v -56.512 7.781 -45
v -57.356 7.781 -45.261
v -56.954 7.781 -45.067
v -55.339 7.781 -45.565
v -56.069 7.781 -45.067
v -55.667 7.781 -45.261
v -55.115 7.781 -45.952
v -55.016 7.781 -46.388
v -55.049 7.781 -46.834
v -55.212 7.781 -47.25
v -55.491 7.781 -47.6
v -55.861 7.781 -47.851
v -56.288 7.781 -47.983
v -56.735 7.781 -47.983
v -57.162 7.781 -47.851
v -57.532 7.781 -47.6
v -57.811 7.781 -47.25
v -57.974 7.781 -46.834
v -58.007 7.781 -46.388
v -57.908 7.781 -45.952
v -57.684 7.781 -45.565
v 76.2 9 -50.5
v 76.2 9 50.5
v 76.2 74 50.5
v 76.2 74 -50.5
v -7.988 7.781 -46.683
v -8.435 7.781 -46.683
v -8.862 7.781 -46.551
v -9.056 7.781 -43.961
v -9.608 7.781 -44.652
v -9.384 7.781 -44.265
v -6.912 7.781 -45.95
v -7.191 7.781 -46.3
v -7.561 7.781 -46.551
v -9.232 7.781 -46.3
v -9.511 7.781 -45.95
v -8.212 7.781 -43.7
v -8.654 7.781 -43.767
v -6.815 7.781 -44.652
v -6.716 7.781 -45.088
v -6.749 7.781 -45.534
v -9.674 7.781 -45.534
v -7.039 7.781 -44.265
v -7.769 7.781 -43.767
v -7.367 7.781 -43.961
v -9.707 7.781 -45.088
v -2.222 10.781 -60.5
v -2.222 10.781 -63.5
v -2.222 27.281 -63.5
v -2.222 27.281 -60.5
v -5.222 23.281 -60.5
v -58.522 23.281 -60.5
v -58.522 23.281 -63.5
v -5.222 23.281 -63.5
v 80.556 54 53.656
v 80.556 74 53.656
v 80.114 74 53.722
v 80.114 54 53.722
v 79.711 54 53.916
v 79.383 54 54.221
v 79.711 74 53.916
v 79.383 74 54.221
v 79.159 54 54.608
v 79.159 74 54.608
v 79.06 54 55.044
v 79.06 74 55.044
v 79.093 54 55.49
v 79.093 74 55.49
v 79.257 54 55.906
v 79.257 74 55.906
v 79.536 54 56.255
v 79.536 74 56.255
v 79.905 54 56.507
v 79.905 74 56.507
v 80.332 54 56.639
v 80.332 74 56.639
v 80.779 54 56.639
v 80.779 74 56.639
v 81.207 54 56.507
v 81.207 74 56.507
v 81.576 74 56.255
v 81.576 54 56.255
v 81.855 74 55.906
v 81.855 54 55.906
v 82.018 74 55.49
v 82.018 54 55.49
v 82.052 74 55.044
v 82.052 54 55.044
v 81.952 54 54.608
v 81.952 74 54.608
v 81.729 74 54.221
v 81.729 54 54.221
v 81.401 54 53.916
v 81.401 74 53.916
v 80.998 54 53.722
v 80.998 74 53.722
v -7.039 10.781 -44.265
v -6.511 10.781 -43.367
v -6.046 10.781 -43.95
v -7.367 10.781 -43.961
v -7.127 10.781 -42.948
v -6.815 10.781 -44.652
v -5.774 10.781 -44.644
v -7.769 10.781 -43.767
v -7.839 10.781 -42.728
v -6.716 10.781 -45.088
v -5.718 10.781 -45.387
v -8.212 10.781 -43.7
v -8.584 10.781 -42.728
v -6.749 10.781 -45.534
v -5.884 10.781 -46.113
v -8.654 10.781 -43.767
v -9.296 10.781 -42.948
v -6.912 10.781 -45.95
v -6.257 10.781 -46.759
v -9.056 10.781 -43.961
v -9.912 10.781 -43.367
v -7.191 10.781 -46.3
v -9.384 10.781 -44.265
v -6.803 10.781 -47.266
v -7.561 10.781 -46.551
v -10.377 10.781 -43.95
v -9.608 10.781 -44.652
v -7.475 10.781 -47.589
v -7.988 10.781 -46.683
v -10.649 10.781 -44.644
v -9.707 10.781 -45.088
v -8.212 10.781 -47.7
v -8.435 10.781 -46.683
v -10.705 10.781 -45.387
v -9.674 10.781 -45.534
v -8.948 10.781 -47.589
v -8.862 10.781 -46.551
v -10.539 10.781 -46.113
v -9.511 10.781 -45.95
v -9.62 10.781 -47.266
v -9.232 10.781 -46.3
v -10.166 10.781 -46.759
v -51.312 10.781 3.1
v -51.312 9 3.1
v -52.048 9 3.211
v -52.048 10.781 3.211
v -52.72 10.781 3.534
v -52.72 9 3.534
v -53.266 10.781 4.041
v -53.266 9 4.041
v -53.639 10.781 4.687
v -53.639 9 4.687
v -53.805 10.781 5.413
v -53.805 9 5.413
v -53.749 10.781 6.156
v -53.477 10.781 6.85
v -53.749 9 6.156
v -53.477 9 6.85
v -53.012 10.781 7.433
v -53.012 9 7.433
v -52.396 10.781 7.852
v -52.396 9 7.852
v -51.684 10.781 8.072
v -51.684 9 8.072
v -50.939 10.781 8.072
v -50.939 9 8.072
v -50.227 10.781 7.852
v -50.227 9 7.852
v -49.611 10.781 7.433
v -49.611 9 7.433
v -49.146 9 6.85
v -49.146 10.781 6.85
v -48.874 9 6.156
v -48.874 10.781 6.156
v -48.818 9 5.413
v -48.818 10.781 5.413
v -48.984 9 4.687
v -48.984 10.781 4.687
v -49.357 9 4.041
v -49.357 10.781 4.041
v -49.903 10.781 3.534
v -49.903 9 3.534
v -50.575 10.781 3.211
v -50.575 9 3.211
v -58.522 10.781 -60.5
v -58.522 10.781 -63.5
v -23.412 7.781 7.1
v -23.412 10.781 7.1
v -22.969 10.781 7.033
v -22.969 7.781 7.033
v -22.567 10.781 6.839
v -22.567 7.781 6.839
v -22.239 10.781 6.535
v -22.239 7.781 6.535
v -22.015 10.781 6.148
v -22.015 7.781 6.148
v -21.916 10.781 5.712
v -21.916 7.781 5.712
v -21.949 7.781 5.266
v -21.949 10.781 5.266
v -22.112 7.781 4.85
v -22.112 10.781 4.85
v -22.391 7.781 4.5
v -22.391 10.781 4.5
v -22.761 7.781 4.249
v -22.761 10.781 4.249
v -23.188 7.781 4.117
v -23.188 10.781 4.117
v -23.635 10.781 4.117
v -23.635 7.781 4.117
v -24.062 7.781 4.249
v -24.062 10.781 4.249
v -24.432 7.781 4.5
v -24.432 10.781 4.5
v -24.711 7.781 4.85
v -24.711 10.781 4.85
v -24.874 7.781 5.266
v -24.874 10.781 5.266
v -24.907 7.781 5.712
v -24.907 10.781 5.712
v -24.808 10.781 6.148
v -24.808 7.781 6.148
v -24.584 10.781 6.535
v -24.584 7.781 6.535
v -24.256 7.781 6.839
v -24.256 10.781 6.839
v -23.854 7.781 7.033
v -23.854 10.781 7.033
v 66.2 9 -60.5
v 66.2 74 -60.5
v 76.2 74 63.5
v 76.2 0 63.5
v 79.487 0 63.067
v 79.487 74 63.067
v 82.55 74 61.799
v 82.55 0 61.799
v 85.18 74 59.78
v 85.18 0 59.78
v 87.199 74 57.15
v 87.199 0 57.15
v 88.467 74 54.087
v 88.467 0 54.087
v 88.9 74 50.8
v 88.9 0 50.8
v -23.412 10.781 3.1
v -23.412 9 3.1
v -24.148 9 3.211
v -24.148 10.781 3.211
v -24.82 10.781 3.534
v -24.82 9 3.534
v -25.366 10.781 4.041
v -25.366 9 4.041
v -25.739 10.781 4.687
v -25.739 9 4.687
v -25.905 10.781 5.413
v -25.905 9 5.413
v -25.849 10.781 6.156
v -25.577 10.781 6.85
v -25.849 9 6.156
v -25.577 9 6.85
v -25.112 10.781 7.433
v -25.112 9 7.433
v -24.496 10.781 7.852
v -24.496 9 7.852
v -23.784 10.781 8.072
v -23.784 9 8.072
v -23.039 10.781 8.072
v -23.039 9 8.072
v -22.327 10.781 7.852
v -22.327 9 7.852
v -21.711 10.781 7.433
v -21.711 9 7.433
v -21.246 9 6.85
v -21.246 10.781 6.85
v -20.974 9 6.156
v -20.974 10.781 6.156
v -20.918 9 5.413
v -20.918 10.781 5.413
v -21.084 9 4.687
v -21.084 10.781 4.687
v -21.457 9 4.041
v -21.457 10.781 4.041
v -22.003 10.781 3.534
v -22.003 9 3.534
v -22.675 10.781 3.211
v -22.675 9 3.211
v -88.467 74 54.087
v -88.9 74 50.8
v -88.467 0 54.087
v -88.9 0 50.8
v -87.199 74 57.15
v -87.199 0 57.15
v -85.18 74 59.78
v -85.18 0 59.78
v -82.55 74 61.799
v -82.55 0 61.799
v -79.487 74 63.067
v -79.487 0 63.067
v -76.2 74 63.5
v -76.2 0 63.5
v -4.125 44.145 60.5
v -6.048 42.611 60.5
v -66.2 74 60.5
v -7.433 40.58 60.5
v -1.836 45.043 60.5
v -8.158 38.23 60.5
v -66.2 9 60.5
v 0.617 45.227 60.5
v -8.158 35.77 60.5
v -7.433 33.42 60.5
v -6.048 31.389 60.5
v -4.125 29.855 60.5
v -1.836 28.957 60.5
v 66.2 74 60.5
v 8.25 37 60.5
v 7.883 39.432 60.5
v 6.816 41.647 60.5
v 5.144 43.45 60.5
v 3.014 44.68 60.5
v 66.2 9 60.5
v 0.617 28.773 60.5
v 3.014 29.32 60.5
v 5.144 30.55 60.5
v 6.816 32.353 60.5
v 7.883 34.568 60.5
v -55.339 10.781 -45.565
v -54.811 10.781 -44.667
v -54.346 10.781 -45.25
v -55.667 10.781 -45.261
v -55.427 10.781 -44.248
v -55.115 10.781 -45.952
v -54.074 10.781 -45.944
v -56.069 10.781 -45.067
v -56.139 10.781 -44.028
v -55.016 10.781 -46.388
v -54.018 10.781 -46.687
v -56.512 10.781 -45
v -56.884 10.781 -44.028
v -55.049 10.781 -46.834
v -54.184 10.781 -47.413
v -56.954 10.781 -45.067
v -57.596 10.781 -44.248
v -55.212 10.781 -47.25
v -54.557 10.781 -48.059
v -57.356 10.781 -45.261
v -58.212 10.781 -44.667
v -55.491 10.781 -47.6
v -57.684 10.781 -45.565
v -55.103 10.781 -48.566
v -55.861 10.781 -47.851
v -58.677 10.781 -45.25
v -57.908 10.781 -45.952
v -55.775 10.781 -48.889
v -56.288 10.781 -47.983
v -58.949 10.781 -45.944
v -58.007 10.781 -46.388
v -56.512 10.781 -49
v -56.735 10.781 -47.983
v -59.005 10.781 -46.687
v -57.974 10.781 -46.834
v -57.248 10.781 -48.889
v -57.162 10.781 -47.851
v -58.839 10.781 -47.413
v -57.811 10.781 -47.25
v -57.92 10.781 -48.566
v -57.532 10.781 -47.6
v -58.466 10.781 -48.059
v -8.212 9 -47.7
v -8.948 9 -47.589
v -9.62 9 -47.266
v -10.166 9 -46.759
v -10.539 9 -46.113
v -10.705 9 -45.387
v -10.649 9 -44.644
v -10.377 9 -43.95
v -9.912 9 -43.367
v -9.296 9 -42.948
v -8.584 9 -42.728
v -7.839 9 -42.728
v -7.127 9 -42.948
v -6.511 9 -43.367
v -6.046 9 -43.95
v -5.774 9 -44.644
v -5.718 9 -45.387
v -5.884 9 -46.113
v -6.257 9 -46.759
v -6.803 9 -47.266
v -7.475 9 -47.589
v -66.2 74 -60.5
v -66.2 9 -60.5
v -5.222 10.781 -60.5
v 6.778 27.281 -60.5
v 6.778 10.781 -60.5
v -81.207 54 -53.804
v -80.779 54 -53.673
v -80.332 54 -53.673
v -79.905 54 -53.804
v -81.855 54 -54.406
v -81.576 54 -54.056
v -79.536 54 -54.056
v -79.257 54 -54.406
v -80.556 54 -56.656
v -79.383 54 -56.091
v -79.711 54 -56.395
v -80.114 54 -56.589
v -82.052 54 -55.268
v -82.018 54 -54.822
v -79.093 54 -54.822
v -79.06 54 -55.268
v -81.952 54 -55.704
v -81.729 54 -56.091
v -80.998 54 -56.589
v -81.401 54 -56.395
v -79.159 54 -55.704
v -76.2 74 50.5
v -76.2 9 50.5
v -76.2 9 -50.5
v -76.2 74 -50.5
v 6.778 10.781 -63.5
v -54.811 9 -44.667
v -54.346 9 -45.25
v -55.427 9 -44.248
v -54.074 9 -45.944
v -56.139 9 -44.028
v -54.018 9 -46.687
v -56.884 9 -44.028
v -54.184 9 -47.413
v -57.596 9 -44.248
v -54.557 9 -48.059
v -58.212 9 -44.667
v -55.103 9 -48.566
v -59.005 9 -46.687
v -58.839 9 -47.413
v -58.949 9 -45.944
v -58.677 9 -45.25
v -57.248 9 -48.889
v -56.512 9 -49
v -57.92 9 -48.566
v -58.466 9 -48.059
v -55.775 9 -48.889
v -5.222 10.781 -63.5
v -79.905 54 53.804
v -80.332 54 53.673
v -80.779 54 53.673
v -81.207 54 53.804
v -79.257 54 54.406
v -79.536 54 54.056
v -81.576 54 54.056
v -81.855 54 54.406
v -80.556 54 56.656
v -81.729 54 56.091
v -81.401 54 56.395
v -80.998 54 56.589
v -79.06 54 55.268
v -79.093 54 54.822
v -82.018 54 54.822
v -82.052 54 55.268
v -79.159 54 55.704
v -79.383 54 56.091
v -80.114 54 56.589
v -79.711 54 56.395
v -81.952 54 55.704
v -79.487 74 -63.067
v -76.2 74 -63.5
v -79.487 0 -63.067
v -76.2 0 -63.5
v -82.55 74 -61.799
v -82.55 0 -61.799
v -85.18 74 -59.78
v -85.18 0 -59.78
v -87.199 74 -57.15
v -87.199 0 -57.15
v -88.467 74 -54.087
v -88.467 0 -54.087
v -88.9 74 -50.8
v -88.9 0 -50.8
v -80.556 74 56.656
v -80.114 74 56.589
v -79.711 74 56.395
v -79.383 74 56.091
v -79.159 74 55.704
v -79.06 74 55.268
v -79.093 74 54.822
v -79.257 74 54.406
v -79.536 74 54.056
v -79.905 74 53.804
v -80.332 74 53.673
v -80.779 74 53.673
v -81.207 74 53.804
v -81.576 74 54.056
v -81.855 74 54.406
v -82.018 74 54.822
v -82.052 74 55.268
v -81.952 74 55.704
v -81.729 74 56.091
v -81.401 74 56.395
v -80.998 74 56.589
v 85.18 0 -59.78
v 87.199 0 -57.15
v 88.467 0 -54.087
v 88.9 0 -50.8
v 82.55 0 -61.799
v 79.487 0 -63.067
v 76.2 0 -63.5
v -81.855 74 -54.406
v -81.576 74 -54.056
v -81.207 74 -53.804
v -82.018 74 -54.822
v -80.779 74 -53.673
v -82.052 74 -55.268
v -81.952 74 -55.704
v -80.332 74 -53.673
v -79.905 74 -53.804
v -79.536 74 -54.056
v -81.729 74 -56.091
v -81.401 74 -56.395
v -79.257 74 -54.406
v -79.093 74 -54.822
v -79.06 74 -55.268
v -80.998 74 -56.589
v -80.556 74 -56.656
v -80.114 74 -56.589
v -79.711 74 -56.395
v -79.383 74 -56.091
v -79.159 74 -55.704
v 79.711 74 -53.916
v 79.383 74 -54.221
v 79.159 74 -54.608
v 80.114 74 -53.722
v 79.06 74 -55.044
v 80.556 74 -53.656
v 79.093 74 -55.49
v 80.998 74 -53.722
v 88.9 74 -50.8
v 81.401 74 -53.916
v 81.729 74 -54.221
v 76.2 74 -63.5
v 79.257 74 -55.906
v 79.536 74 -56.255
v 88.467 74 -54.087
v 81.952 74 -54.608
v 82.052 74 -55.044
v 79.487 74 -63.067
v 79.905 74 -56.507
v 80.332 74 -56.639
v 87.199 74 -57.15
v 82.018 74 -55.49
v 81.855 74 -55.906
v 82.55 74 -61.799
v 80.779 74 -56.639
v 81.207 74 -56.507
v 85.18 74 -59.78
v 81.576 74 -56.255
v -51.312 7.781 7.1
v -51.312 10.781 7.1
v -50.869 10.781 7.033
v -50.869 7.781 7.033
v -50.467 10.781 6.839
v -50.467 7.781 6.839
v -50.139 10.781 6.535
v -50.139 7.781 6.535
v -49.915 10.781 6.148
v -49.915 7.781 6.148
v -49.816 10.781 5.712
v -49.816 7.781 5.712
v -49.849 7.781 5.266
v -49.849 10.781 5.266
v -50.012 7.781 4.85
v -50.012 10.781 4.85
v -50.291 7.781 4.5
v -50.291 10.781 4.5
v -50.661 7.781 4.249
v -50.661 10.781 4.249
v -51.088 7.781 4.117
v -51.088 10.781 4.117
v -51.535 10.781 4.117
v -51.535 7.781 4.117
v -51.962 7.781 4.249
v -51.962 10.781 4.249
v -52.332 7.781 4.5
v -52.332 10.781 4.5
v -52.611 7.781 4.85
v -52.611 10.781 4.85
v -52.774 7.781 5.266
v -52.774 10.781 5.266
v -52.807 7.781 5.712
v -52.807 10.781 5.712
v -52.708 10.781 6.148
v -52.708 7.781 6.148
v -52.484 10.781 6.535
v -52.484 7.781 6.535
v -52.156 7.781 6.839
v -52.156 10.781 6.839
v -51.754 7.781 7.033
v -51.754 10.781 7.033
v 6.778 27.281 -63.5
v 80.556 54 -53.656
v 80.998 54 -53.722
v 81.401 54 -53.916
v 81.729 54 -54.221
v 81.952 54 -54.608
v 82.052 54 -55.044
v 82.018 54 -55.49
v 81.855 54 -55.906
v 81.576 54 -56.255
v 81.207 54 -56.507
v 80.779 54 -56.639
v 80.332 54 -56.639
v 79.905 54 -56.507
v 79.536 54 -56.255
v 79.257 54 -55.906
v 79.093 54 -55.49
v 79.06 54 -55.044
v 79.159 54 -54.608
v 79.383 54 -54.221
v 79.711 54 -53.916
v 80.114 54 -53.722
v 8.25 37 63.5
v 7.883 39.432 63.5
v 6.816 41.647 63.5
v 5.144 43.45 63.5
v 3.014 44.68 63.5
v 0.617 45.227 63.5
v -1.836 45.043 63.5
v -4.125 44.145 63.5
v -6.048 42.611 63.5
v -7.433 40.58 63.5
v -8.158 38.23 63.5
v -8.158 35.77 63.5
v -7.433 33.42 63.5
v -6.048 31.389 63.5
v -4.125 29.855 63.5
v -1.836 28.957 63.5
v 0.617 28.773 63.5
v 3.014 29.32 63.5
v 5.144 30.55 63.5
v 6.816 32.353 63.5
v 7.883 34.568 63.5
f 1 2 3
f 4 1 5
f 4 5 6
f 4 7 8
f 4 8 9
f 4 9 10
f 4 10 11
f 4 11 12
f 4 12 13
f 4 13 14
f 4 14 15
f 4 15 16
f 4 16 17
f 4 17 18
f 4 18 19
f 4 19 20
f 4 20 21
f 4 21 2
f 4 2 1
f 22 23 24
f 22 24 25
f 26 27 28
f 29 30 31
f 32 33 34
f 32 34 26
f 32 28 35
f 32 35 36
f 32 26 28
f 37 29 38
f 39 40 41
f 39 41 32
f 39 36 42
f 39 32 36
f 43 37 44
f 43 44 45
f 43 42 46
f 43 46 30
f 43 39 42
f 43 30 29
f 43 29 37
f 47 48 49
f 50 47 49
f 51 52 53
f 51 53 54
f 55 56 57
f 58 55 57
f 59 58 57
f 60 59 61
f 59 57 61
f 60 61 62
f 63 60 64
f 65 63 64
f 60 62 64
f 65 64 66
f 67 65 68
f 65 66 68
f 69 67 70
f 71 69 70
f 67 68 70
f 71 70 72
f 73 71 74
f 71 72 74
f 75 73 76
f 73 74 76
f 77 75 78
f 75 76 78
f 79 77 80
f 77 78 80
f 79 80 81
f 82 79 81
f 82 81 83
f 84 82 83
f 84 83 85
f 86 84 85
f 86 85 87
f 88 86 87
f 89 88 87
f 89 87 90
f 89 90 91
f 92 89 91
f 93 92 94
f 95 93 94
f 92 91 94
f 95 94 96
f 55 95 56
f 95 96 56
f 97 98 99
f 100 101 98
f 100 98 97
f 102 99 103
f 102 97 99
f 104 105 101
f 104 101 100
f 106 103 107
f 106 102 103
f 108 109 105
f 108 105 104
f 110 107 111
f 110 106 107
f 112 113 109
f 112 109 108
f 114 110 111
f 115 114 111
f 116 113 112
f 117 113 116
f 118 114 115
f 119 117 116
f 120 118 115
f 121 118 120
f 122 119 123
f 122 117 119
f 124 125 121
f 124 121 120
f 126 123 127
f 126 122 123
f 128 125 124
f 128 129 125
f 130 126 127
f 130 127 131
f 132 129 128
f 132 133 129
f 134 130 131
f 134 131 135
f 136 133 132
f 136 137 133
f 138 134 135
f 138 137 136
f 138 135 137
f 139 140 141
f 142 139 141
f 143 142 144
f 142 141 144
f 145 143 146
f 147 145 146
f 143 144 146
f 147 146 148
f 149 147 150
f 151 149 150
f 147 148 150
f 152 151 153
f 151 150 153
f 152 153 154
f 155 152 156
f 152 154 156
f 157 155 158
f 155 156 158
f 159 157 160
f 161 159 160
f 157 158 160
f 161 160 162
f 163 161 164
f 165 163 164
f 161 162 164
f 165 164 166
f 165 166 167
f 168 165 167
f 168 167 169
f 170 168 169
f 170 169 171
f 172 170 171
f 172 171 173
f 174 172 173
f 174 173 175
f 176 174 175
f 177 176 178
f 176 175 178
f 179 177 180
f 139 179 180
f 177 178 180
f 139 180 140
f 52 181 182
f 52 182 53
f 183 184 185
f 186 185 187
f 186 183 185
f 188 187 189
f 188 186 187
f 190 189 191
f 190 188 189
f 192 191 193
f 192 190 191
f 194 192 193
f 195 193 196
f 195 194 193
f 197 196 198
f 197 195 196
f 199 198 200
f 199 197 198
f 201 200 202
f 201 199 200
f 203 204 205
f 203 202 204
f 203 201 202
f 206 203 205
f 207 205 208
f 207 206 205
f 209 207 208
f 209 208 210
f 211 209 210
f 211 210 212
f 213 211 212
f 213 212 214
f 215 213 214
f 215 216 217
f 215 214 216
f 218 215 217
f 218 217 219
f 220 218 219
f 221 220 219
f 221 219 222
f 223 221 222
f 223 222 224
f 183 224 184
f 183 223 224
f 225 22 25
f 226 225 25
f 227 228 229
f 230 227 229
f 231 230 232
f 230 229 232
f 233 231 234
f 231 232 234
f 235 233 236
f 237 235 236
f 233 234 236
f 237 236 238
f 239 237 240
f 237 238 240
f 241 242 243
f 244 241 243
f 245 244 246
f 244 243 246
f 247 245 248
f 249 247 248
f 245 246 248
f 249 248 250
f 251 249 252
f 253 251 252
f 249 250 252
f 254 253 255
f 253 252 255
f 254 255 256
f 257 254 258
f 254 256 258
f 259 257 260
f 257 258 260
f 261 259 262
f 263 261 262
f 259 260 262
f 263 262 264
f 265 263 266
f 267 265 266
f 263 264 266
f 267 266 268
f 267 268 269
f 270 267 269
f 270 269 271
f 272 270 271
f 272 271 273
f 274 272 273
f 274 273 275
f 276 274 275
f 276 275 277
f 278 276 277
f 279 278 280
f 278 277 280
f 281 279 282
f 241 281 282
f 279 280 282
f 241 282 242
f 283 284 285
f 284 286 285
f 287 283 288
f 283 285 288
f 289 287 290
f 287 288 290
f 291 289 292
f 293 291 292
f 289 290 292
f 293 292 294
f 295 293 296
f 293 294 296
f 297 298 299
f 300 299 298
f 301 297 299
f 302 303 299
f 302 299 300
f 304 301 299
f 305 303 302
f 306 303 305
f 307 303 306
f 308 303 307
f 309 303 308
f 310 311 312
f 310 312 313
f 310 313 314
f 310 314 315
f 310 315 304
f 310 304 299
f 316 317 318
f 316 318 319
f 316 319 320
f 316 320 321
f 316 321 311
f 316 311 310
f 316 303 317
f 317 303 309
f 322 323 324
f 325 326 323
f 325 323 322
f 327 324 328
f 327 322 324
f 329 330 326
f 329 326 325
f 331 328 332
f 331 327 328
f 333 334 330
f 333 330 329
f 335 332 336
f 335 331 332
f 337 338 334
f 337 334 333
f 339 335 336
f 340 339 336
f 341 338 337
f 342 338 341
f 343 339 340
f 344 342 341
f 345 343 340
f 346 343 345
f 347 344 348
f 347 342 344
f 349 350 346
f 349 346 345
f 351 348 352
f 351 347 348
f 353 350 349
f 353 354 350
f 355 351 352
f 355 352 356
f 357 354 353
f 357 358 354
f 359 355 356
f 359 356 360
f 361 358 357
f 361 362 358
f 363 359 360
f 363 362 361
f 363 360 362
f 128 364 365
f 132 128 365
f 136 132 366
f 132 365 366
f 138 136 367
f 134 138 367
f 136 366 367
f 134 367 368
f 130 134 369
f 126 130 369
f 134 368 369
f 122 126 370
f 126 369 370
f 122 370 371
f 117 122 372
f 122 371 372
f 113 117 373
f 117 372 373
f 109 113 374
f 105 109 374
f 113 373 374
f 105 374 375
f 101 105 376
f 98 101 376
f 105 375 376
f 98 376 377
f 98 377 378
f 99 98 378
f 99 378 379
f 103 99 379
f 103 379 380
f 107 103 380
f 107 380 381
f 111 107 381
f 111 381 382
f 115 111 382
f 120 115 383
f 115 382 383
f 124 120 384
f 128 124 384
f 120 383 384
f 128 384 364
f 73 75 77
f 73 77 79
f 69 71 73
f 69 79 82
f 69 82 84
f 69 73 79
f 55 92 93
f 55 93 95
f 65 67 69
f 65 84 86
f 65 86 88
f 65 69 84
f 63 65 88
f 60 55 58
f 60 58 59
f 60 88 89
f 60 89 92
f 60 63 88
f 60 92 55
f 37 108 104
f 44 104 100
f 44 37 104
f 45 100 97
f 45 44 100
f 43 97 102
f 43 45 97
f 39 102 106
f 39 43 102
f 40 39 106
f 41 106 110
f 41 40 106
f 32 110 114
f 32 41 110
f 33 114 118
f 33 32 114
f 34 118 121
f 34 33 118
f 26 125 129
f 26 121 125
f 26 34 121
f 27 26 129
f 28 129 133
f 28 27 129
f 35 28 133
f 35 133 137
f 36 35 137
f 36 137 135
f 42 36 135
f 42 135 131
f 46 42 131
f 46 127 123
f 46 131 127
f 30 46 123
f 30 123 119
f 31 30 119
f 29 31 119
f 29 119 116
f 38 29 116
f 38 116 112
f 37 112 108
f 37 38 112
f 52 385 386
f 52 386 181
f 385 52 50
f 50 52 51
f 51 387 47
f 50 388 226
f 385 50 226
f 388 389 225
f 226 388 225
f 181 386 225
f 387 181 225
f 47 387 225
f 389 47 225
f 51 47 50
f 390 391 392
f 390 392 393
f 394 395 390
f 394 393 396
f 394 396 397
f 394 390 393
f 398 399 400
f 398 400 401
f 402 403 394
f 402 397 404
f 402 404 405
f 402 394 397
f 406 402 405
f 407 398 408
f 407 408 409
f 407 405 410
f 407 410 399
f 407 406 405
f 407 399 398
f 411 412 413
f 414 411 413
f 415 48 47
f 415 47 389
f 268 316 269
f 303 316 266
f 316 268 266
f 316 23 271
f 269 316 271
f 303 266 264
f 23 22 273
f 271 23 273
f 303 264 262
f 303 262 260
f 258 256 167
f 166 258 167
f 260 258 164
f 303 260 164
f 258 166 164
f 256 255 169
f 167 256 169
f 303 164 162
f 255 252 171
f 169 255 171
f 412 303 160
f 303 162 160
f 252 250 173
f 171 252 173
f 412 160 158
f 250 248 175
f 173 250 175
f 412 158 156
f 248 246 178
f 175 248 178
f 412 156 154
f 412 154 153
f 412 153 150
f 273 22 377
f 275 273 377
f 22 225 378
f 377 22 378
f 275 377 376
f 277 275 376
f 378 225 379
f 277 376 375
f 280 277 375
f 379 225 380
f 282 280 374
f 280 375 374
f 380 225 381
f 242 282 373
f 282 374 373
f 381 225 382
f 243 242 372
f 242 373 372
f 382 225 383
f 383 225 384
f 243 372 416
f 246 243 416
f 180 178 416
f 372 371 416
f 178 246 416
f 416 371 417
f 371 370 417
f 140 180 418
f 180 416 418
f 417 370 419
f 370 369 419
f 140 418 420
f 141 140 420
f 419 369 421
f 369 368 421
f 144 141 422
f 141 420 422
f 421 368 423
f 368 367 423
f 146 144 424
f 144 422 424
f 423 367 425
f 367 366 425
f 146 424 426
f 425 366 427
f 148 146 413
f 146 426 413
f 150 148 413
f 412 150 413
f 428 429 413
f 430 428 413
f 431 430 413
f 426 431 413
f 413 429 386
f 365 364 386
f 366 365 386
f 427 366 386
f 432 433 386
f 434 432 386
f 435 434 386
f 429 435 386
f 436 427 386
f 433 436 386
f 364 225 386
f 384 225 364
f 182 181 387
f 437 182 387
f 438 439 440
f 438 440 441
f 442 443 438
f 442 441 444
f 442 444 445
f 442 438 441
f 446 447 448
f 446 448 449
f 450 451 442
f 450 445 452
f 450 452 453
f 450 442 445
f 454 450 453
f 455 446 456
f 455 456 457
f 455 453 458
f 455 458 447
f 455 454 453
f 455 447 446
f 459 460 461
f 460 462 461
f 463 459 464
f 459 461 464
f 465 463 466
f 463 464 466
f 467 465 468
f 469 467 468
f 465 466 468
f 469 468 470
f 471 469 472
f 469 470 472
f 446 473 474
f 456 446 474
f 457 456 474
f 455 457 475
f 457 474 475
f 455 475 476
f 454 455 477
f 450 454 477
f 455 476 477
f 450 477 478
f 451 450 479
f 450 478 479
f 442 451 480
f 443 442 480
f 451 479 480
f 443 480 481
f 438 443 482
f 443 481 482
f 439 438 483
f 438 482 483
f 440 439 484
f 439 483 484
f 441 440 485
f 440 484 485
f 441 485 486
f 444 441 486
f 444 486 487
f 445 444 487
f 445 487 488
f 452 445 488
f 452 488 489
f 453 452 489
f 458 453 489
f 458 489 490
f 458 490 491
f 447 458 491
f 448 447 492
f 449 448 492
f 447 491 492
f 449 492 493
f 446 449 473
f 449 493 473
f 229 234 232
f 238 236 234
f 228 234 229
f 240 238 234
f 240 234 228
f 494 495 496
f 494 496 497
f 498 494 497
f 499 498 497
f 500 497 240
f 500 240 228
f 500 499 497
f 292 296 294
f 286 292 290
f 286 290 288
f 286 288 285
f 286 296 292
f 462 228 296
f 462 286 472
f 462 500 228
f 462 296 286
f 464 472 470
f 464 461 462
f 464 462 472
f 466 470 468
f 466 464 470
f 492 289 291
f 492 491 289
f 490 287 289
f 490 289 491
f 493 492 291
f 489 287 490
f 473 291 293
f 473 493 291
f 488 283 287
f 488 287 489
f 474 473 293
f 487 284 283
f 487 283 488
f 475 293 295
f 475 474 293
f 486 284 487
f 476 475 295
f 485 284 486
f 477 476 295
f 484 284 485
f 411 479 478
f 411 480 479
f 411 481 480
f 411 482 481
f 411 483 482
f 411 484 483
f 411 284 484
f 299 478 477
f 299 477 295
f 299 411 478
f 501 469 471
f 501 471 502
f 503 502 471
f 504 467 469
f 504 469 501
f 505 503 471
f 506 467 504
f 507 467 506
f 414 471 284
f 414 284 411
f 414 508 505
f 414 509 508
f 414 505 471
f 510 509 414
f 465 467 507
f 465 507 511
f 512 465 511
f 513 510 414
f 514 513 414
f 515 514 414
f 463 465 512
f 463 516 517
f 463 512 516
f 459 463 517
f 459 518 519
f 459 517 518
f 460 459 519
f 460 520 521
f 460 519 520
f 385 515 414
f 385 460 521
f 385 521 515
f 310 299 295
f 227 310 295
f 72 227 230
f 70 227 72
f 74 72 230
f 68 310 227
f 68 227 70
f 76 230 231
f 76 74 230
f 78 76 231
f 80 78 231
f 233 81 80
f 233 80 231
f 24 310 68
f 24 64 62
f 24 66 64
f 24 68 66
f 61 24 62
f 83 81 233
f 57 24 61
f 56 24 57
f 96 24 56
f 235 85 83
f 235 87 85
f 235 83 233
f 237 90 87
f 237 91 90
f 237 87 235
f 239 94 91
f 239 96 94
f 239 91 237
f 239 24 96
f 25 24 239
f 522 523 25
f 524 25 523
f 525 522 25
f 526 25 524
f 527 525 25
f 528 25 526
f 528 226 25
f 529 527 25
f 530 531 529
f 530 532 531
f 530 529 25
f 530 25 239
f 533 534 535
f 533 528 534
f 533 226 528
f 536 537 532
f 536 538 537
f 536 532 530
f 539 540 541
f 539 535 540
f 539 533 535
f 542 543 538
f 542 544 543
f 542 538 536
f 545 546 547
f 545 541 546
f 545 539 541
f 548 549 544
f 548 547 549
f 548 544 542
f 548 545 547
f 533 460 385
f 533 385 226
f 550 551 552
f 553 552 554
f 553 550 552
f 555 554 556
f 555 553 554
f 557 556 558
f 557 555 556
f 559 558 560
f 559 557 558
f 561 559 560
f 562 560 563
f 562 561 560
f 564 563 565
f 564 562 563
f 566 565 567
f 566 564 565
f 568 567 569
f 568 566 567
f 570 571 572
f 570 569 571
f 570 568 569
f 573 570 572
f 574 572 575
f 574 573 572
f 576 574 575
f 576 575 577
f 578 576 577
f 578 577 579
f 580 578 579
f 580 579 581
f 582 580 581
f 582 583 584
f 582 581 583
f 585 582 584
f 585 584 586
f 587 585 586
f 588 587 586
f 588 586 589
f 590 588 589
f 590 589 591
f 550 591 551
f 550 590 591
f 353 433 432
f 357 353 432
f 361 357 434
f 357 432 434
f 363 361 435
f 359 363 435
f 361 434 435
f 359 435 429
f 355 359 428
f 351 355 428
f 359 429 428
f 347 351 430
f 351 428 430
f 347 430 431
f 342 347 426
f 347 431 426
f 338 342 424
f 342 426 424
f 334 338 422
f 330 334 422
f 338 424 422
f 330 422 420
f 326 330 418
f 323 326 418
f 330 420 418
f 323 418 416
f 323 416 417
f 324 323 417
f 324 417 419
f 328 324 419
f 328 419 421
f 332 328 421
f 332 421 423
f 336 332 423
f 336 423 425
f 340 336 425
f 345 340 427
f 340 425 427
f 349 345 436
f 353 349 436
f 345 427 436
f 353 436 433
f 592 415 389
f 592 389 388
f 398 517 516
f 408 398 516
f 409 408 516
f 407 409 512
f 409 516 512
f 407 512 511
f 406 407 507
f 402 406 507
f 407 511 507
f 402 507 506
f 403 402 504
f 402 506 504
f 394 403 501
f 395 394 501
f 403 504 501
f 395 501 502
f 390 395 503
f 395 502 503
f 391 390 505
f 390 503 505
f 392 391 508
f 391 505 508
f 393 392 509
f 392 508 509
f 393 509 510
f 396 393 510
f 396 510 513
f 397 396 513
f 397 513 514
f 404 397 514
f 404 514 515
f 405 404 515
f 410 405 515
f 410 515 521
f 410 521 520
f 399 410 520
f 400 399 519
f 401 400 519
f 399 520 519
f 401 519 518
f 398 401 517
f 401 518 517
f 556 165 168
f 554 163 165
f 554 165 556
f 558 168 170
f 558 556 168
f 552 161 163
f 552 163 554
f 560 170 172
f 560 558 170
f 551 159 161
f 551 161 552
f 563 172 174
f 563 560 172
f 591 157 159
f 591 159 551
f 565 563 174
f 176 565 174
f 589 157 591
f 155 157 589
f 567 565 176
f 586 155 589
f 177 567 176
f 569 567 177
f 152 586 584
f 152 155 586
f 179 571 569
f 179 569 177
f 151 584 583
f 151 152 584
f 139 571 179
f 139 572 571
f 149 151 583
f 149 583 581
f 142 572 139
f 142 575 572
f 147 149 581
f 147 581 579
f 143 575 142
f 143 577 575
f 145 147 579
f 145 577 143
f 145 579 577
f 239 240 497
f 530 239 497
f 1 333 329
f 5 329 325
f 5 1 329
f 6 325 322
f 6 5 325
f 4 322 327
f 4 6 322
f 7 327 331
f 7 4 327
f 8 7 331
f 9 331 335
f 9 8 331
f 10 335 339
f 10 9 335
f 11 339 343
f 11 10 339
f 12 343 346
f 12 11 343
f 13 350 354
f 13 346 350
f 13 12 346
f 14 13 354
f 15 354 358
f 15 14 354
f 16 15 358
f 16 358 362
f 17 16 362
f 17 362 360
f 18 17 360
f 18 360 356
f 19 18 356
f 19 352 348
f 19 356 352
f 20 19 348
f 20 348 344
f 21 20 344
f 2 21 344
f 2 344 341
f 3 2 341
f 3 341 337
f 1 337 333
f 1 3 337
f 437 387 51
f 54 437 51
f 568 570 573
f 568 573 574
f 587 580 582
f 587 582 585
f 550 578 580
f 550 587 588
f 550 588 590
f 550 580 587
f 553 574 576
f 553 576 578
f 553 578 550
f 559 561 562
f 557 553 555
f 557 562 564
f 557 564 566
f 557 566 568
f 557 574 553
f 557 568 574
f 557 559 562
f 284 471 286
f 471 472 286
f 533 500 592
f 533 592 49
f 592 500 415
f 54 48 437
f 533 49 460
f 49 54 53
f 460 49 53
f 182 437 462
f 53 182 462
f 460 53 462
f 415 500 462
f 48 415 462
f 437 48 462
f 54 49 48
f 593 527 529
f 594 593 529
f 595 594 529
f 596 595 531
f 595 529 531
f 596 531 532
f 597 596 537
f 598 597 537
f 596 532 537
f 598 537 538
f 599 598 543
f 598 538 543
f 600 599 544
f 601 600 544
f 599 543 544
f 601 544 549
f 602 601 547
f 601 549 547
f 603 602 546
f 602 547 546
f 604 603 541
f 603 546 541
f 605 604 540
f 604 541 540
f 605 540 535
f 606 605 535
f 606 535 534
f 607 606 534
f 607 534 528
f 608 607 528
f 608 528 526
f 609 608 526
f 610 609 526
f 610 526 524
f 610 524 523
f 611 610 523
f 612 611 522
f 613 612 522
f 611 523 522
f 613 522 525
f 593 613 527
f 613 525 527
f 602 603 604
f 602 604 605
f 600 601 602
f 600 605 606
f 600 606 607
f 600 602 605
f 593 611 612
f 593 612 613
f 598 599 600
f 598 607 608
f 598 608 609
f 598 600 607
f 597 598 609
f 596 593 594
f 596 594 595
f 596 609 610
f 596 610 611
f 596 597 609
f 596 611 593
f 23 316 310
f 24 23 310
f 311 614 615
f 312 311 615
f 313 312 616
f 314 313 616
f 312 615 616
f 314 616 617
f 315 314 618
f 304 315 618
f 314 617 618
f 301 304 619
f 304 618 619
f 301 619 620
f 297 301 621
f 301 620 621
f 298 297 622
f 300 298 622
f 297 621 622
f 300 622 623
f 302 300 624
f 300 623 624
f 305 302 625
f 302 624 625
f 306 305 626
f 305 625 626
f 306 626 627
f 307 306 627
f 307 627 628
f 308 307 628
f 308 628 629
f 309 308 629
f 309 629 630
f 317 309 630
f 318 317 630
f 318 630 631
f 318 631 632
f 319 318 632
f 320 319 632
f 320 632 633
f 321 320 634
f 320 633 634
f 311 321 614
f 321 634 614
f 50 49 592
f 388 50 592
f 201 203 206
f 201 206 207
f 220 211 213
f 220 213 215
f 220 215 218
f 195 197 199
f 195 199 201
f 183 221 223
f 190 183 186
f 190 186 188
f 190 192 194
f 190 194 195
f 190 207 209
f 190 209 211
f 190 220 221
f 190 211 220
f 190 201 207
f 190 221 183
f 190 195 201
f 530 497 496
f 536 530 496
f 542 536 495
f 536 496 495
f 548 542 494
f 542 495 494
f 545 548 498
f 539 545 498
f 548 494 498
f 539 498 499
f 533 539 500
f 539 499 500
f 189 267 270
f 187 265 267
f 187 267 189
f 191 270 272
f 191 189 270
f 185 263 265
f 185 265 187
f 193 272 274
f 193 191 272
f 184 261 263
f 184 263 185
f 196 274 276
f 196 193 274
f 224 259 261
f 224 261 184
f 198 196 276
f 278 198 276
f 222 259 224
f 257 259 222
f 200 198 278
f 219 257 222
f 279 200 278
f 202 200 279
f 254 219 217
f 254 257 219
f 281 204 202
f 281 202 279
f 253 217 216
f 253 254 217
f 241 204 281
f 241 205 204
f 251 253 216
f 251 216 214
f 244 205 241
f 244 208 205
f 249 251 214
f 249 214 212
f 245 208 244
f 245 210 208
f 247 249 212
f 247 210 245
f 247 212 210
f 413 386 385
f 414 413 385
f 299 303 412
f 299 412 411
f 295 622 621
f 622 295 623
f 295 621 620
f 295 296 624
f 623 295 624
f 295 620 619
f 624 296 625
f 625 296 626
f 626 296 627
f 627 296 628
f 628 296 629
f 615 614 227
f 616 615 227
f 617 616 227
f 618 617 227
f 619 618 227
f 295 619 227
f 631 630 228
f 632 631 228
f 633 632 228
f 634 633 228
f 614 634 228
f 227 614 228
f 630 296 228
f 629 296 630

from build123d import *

# Parameters (mm, degrees)
BOSS_EXTRUDE1_DEPTH     = 9
SKETCH2_W               = 152.4
SKETCH2_H               = 121
BOSS_EXTRUDE2_DEPTH     = 65
CHAMFER1_SIZE           = 10
SKETCH3_W               = 53.3
SKETCH3_H               = 12.5
CUT_EXTRUDE1_DEPTH      = 170.573612334
SKETCH4_R               = 2.5
BOSS_EXTRUDE3_DEPTH     = 1.780724539
CUT_EXTRUDE4_DEPTH      = 3
CUT_EXTRUDE4_DEPTH_BACK = 3
SKETCH5_R               = 1.5
CUT_EXTRUDE6_DEPTH      = 3
CUT_EXTRUDE6_DEPTH_BACK = 3
SKETCH7_W               = 9
SKETCH7_H               = 16.5
SKETCH8_R               = 8.25
CUT_EXTRUDE7_DEPTH      = 3
SKETCH9_R               = 1.5
CUT_EXTRUDE8_DEPTH      = 20


with BuildPart() as part:
    # Sketch1 → Boss-Extrude1 (new body)
    with BuildSketch(Plane(origin=(0, 0, 0), x_dir=(1, 0, 0), z_dir=(0, 1, 0))):
        with BuildLine():
            Line((-76.2, 63.5), (76.2, 63.5))
            ThreePointArc((76.2, 63.5), (85.180256121, 59.780256121), (88.9, 50.8))
            Line((88.9, 50.8), (88.9, -50.8))
            ThreePointArc((88.9, -50.8), (85.180256121, -59.780256121), (76.2, -63.5))
            Line((76.2, -63.5), (-76.2, -63.5))
            ThreePointArc((-76.2, -63.5), (-85.180256121, -59.780256121), (-88.9, -50.8))
            Line((-88.9, -50.8), (-88.9, 50.8))
            ThreePointArc((-88.9, 50.8), (-85.180256121, 59.780256121), (-76.2, 63.5))
        make_face()
    extrude(amount=BOSS_EXTRUDE1_DEPTH)

    # Sketch2 → Boss-Extrude2 (add)
    with BuildSketch(Plane(origin=(0, 9, 0), x_dir=(1, 0, 0), z_dir=(0, 1, 0))):
        with BuildLine():
            Line((76.2, 63.5), (-76.2, 63.5))
            ThreePointArc((-76.2, 63.5), (-85.180256121, 59.780256121), (-88.9, 50.8))
            Line((-88.9, 50.8), (-88.9, -50.8))
            ThreePointArc((-88.9, -50.8), (-85.180256121, -59.780256121), (-76.2, -63.5))
            Line((-76.2, -63.5), (76.2, -63.5))
            ThreePointArc((76.2, -63.5), (85.180256121, -59.780256121), (88.9, -50.8))
            Line((88.9, -50.8), (88.9, 50.8))
            ThreePointArc((88.9, 50.8), (85.180256121, 59.780256121), (76.2, 63.5))
        make_face()
        Rectangle(SKETCH2_W, SKETCH2_H, mode=Mode.SUBTRACT)
    extrude(amount=BOSS_EXTRUDE2_DEPTH)

    # Chamfer1
    chamfer1_edges = [part.edges().sort_by_distance(p)[0] for p in [
        (76.2, 41.5, -60.5),
        (-76.2, 41.5, -60.5),
        (-76.2, 41.5, 60.5),
        (76.2, 41.5, 60.5),
    ]]
    chamfer(chamfer1_edges, length=CHAMFER1_SIZE)

    # Sketch3 → Cut-Extrude1 (cut, through all)
    with BuildSketch(Plane.XY.offset(-60.5)):
        with Locations((-31.872362203, 17.030724539)):
            Rectangle(SKETCH3_W, SKETCH3_H)
    extrude(amount=-CUT_EXTRUDE1_DEPTH, mode=Mode.SUBTRACT)

    # Sketch4 → Boss-Extrude3 (add)
    with BuildSketch(Plane(origin=(0, 9, 0), x_dir=(1, 0, 0), z_dir=(0, 1, 0))):
        with Locations(Location((-56.511501143, 46.5, 0), (0, 0, 90))):
            Circle(SKETCH4_R)
        with Locations(Location((-8.211501143, 45.2, 0), (0, 0, 90))):
            Circle(SKETCH4_R)
        with Locations(Location((-23.411501143, -5.6, 0), (0, 0, 90))):
            Circle(SKETCH4_R)
        with Locations(Location((-51.311501143, -5.6, 0), (0, 0, 90))):
            Circle(SKETCH4_R)
    extrude(amount=BOSS_EXTRUDE3_DEPTH)

    # Sketch5 → Cut-Extrude4 (cut, two sides: drawn at the far end of the back side and taken through both)
    with BuildSketch(Plane(origin=(0, 10.780724539, 0), x_dir=(1, 0, 0), z_dir=(0, 1, 0)).offset(-CUT_EXTRUDE4_DEPTH_BACK)):
        with Locations(Location((-23.411501143, -5.6, 0), (0, 0, 270))):
            Circle(SKETCH5_R)
        with Locations(Location((-51.311501143, -5.6, 0), (0, 0, 270))):
            Circle(SKETCH5_R)
        with Locations(Location((-56.511501143, 46.5, 0), (0, 0, 270))):
            Circle(SKETCH5_R)
        with Locations(Location((-8.211501143, 45.2, 0), (0, 0, 270))):
            Circle(SKETCH5_R)
    extrude(amount=CUT_EXTRUDE4_DEPTH + CUT_EXTRUDE4_DEPTH_BACK, mode=Mode.SUBTRACT)

    # Sketch7 → Cut-Extrude6 (cut, two sides: drawn at the far end of the back side and taken through both)
    with BuildSketch(Plane.XY.offset(-60.5).offset(-CUT_EXTRUDE6_DEPTH_BACK)):
        with Locations((2.277637797, 19.030724539)):
            Rectangle(SKETCH7_W, SKETCH7_H)
    extrude(amount=CUT_EXTRUDE6_DEPTH + CUT_EXTRUDE6_DEPTH_BACK, mode=Mode.SUBTRACT)

    # Sketch8 → Cut-Extrude7 (cut)
    with BuildSketch(Plane.XY.offset(63.5)):
        with Locations((0, 37)):
            Circle(SKETCH8_R)
    extrude(amount=-CUT_EXTRUDE7_DEPTH, mode=Mode.SUBTRACT)

    # Sketch9 → Cut-Extrude8 (cut)
    with BuildSketch(Plane(origin=(0, 74, 0), x_dir=(1, 0, 0), z_dir=(0, 1, 0))):
        with Locations(Location((-80.555777772, -55.155777772, 0), (0, 0, 270))):
            Circle(SKETCH9_R)
        with Locations(Location((-80.555777772, 55.155777772, 0), (0, 0, 90))):
            Circle(SKETCH9_R)
        with Locations((29.755777772, -55.155777772)):
            Circle(SKETCH9_R)
        with Locations(Location((80.555777772, 55.155777772, 0), (0, 0, 270))):
            Circle(SKETCH9_R)
        with Locations(Location((80.555777772, -55.155777772, 0), (0, 0, 90))):
            Circle(SKETCH9_R)
    extrude(amount=-CUT_EXTRUDE8_DEPTH, mode=Mode.SUBTRACT)


solid = part.part
